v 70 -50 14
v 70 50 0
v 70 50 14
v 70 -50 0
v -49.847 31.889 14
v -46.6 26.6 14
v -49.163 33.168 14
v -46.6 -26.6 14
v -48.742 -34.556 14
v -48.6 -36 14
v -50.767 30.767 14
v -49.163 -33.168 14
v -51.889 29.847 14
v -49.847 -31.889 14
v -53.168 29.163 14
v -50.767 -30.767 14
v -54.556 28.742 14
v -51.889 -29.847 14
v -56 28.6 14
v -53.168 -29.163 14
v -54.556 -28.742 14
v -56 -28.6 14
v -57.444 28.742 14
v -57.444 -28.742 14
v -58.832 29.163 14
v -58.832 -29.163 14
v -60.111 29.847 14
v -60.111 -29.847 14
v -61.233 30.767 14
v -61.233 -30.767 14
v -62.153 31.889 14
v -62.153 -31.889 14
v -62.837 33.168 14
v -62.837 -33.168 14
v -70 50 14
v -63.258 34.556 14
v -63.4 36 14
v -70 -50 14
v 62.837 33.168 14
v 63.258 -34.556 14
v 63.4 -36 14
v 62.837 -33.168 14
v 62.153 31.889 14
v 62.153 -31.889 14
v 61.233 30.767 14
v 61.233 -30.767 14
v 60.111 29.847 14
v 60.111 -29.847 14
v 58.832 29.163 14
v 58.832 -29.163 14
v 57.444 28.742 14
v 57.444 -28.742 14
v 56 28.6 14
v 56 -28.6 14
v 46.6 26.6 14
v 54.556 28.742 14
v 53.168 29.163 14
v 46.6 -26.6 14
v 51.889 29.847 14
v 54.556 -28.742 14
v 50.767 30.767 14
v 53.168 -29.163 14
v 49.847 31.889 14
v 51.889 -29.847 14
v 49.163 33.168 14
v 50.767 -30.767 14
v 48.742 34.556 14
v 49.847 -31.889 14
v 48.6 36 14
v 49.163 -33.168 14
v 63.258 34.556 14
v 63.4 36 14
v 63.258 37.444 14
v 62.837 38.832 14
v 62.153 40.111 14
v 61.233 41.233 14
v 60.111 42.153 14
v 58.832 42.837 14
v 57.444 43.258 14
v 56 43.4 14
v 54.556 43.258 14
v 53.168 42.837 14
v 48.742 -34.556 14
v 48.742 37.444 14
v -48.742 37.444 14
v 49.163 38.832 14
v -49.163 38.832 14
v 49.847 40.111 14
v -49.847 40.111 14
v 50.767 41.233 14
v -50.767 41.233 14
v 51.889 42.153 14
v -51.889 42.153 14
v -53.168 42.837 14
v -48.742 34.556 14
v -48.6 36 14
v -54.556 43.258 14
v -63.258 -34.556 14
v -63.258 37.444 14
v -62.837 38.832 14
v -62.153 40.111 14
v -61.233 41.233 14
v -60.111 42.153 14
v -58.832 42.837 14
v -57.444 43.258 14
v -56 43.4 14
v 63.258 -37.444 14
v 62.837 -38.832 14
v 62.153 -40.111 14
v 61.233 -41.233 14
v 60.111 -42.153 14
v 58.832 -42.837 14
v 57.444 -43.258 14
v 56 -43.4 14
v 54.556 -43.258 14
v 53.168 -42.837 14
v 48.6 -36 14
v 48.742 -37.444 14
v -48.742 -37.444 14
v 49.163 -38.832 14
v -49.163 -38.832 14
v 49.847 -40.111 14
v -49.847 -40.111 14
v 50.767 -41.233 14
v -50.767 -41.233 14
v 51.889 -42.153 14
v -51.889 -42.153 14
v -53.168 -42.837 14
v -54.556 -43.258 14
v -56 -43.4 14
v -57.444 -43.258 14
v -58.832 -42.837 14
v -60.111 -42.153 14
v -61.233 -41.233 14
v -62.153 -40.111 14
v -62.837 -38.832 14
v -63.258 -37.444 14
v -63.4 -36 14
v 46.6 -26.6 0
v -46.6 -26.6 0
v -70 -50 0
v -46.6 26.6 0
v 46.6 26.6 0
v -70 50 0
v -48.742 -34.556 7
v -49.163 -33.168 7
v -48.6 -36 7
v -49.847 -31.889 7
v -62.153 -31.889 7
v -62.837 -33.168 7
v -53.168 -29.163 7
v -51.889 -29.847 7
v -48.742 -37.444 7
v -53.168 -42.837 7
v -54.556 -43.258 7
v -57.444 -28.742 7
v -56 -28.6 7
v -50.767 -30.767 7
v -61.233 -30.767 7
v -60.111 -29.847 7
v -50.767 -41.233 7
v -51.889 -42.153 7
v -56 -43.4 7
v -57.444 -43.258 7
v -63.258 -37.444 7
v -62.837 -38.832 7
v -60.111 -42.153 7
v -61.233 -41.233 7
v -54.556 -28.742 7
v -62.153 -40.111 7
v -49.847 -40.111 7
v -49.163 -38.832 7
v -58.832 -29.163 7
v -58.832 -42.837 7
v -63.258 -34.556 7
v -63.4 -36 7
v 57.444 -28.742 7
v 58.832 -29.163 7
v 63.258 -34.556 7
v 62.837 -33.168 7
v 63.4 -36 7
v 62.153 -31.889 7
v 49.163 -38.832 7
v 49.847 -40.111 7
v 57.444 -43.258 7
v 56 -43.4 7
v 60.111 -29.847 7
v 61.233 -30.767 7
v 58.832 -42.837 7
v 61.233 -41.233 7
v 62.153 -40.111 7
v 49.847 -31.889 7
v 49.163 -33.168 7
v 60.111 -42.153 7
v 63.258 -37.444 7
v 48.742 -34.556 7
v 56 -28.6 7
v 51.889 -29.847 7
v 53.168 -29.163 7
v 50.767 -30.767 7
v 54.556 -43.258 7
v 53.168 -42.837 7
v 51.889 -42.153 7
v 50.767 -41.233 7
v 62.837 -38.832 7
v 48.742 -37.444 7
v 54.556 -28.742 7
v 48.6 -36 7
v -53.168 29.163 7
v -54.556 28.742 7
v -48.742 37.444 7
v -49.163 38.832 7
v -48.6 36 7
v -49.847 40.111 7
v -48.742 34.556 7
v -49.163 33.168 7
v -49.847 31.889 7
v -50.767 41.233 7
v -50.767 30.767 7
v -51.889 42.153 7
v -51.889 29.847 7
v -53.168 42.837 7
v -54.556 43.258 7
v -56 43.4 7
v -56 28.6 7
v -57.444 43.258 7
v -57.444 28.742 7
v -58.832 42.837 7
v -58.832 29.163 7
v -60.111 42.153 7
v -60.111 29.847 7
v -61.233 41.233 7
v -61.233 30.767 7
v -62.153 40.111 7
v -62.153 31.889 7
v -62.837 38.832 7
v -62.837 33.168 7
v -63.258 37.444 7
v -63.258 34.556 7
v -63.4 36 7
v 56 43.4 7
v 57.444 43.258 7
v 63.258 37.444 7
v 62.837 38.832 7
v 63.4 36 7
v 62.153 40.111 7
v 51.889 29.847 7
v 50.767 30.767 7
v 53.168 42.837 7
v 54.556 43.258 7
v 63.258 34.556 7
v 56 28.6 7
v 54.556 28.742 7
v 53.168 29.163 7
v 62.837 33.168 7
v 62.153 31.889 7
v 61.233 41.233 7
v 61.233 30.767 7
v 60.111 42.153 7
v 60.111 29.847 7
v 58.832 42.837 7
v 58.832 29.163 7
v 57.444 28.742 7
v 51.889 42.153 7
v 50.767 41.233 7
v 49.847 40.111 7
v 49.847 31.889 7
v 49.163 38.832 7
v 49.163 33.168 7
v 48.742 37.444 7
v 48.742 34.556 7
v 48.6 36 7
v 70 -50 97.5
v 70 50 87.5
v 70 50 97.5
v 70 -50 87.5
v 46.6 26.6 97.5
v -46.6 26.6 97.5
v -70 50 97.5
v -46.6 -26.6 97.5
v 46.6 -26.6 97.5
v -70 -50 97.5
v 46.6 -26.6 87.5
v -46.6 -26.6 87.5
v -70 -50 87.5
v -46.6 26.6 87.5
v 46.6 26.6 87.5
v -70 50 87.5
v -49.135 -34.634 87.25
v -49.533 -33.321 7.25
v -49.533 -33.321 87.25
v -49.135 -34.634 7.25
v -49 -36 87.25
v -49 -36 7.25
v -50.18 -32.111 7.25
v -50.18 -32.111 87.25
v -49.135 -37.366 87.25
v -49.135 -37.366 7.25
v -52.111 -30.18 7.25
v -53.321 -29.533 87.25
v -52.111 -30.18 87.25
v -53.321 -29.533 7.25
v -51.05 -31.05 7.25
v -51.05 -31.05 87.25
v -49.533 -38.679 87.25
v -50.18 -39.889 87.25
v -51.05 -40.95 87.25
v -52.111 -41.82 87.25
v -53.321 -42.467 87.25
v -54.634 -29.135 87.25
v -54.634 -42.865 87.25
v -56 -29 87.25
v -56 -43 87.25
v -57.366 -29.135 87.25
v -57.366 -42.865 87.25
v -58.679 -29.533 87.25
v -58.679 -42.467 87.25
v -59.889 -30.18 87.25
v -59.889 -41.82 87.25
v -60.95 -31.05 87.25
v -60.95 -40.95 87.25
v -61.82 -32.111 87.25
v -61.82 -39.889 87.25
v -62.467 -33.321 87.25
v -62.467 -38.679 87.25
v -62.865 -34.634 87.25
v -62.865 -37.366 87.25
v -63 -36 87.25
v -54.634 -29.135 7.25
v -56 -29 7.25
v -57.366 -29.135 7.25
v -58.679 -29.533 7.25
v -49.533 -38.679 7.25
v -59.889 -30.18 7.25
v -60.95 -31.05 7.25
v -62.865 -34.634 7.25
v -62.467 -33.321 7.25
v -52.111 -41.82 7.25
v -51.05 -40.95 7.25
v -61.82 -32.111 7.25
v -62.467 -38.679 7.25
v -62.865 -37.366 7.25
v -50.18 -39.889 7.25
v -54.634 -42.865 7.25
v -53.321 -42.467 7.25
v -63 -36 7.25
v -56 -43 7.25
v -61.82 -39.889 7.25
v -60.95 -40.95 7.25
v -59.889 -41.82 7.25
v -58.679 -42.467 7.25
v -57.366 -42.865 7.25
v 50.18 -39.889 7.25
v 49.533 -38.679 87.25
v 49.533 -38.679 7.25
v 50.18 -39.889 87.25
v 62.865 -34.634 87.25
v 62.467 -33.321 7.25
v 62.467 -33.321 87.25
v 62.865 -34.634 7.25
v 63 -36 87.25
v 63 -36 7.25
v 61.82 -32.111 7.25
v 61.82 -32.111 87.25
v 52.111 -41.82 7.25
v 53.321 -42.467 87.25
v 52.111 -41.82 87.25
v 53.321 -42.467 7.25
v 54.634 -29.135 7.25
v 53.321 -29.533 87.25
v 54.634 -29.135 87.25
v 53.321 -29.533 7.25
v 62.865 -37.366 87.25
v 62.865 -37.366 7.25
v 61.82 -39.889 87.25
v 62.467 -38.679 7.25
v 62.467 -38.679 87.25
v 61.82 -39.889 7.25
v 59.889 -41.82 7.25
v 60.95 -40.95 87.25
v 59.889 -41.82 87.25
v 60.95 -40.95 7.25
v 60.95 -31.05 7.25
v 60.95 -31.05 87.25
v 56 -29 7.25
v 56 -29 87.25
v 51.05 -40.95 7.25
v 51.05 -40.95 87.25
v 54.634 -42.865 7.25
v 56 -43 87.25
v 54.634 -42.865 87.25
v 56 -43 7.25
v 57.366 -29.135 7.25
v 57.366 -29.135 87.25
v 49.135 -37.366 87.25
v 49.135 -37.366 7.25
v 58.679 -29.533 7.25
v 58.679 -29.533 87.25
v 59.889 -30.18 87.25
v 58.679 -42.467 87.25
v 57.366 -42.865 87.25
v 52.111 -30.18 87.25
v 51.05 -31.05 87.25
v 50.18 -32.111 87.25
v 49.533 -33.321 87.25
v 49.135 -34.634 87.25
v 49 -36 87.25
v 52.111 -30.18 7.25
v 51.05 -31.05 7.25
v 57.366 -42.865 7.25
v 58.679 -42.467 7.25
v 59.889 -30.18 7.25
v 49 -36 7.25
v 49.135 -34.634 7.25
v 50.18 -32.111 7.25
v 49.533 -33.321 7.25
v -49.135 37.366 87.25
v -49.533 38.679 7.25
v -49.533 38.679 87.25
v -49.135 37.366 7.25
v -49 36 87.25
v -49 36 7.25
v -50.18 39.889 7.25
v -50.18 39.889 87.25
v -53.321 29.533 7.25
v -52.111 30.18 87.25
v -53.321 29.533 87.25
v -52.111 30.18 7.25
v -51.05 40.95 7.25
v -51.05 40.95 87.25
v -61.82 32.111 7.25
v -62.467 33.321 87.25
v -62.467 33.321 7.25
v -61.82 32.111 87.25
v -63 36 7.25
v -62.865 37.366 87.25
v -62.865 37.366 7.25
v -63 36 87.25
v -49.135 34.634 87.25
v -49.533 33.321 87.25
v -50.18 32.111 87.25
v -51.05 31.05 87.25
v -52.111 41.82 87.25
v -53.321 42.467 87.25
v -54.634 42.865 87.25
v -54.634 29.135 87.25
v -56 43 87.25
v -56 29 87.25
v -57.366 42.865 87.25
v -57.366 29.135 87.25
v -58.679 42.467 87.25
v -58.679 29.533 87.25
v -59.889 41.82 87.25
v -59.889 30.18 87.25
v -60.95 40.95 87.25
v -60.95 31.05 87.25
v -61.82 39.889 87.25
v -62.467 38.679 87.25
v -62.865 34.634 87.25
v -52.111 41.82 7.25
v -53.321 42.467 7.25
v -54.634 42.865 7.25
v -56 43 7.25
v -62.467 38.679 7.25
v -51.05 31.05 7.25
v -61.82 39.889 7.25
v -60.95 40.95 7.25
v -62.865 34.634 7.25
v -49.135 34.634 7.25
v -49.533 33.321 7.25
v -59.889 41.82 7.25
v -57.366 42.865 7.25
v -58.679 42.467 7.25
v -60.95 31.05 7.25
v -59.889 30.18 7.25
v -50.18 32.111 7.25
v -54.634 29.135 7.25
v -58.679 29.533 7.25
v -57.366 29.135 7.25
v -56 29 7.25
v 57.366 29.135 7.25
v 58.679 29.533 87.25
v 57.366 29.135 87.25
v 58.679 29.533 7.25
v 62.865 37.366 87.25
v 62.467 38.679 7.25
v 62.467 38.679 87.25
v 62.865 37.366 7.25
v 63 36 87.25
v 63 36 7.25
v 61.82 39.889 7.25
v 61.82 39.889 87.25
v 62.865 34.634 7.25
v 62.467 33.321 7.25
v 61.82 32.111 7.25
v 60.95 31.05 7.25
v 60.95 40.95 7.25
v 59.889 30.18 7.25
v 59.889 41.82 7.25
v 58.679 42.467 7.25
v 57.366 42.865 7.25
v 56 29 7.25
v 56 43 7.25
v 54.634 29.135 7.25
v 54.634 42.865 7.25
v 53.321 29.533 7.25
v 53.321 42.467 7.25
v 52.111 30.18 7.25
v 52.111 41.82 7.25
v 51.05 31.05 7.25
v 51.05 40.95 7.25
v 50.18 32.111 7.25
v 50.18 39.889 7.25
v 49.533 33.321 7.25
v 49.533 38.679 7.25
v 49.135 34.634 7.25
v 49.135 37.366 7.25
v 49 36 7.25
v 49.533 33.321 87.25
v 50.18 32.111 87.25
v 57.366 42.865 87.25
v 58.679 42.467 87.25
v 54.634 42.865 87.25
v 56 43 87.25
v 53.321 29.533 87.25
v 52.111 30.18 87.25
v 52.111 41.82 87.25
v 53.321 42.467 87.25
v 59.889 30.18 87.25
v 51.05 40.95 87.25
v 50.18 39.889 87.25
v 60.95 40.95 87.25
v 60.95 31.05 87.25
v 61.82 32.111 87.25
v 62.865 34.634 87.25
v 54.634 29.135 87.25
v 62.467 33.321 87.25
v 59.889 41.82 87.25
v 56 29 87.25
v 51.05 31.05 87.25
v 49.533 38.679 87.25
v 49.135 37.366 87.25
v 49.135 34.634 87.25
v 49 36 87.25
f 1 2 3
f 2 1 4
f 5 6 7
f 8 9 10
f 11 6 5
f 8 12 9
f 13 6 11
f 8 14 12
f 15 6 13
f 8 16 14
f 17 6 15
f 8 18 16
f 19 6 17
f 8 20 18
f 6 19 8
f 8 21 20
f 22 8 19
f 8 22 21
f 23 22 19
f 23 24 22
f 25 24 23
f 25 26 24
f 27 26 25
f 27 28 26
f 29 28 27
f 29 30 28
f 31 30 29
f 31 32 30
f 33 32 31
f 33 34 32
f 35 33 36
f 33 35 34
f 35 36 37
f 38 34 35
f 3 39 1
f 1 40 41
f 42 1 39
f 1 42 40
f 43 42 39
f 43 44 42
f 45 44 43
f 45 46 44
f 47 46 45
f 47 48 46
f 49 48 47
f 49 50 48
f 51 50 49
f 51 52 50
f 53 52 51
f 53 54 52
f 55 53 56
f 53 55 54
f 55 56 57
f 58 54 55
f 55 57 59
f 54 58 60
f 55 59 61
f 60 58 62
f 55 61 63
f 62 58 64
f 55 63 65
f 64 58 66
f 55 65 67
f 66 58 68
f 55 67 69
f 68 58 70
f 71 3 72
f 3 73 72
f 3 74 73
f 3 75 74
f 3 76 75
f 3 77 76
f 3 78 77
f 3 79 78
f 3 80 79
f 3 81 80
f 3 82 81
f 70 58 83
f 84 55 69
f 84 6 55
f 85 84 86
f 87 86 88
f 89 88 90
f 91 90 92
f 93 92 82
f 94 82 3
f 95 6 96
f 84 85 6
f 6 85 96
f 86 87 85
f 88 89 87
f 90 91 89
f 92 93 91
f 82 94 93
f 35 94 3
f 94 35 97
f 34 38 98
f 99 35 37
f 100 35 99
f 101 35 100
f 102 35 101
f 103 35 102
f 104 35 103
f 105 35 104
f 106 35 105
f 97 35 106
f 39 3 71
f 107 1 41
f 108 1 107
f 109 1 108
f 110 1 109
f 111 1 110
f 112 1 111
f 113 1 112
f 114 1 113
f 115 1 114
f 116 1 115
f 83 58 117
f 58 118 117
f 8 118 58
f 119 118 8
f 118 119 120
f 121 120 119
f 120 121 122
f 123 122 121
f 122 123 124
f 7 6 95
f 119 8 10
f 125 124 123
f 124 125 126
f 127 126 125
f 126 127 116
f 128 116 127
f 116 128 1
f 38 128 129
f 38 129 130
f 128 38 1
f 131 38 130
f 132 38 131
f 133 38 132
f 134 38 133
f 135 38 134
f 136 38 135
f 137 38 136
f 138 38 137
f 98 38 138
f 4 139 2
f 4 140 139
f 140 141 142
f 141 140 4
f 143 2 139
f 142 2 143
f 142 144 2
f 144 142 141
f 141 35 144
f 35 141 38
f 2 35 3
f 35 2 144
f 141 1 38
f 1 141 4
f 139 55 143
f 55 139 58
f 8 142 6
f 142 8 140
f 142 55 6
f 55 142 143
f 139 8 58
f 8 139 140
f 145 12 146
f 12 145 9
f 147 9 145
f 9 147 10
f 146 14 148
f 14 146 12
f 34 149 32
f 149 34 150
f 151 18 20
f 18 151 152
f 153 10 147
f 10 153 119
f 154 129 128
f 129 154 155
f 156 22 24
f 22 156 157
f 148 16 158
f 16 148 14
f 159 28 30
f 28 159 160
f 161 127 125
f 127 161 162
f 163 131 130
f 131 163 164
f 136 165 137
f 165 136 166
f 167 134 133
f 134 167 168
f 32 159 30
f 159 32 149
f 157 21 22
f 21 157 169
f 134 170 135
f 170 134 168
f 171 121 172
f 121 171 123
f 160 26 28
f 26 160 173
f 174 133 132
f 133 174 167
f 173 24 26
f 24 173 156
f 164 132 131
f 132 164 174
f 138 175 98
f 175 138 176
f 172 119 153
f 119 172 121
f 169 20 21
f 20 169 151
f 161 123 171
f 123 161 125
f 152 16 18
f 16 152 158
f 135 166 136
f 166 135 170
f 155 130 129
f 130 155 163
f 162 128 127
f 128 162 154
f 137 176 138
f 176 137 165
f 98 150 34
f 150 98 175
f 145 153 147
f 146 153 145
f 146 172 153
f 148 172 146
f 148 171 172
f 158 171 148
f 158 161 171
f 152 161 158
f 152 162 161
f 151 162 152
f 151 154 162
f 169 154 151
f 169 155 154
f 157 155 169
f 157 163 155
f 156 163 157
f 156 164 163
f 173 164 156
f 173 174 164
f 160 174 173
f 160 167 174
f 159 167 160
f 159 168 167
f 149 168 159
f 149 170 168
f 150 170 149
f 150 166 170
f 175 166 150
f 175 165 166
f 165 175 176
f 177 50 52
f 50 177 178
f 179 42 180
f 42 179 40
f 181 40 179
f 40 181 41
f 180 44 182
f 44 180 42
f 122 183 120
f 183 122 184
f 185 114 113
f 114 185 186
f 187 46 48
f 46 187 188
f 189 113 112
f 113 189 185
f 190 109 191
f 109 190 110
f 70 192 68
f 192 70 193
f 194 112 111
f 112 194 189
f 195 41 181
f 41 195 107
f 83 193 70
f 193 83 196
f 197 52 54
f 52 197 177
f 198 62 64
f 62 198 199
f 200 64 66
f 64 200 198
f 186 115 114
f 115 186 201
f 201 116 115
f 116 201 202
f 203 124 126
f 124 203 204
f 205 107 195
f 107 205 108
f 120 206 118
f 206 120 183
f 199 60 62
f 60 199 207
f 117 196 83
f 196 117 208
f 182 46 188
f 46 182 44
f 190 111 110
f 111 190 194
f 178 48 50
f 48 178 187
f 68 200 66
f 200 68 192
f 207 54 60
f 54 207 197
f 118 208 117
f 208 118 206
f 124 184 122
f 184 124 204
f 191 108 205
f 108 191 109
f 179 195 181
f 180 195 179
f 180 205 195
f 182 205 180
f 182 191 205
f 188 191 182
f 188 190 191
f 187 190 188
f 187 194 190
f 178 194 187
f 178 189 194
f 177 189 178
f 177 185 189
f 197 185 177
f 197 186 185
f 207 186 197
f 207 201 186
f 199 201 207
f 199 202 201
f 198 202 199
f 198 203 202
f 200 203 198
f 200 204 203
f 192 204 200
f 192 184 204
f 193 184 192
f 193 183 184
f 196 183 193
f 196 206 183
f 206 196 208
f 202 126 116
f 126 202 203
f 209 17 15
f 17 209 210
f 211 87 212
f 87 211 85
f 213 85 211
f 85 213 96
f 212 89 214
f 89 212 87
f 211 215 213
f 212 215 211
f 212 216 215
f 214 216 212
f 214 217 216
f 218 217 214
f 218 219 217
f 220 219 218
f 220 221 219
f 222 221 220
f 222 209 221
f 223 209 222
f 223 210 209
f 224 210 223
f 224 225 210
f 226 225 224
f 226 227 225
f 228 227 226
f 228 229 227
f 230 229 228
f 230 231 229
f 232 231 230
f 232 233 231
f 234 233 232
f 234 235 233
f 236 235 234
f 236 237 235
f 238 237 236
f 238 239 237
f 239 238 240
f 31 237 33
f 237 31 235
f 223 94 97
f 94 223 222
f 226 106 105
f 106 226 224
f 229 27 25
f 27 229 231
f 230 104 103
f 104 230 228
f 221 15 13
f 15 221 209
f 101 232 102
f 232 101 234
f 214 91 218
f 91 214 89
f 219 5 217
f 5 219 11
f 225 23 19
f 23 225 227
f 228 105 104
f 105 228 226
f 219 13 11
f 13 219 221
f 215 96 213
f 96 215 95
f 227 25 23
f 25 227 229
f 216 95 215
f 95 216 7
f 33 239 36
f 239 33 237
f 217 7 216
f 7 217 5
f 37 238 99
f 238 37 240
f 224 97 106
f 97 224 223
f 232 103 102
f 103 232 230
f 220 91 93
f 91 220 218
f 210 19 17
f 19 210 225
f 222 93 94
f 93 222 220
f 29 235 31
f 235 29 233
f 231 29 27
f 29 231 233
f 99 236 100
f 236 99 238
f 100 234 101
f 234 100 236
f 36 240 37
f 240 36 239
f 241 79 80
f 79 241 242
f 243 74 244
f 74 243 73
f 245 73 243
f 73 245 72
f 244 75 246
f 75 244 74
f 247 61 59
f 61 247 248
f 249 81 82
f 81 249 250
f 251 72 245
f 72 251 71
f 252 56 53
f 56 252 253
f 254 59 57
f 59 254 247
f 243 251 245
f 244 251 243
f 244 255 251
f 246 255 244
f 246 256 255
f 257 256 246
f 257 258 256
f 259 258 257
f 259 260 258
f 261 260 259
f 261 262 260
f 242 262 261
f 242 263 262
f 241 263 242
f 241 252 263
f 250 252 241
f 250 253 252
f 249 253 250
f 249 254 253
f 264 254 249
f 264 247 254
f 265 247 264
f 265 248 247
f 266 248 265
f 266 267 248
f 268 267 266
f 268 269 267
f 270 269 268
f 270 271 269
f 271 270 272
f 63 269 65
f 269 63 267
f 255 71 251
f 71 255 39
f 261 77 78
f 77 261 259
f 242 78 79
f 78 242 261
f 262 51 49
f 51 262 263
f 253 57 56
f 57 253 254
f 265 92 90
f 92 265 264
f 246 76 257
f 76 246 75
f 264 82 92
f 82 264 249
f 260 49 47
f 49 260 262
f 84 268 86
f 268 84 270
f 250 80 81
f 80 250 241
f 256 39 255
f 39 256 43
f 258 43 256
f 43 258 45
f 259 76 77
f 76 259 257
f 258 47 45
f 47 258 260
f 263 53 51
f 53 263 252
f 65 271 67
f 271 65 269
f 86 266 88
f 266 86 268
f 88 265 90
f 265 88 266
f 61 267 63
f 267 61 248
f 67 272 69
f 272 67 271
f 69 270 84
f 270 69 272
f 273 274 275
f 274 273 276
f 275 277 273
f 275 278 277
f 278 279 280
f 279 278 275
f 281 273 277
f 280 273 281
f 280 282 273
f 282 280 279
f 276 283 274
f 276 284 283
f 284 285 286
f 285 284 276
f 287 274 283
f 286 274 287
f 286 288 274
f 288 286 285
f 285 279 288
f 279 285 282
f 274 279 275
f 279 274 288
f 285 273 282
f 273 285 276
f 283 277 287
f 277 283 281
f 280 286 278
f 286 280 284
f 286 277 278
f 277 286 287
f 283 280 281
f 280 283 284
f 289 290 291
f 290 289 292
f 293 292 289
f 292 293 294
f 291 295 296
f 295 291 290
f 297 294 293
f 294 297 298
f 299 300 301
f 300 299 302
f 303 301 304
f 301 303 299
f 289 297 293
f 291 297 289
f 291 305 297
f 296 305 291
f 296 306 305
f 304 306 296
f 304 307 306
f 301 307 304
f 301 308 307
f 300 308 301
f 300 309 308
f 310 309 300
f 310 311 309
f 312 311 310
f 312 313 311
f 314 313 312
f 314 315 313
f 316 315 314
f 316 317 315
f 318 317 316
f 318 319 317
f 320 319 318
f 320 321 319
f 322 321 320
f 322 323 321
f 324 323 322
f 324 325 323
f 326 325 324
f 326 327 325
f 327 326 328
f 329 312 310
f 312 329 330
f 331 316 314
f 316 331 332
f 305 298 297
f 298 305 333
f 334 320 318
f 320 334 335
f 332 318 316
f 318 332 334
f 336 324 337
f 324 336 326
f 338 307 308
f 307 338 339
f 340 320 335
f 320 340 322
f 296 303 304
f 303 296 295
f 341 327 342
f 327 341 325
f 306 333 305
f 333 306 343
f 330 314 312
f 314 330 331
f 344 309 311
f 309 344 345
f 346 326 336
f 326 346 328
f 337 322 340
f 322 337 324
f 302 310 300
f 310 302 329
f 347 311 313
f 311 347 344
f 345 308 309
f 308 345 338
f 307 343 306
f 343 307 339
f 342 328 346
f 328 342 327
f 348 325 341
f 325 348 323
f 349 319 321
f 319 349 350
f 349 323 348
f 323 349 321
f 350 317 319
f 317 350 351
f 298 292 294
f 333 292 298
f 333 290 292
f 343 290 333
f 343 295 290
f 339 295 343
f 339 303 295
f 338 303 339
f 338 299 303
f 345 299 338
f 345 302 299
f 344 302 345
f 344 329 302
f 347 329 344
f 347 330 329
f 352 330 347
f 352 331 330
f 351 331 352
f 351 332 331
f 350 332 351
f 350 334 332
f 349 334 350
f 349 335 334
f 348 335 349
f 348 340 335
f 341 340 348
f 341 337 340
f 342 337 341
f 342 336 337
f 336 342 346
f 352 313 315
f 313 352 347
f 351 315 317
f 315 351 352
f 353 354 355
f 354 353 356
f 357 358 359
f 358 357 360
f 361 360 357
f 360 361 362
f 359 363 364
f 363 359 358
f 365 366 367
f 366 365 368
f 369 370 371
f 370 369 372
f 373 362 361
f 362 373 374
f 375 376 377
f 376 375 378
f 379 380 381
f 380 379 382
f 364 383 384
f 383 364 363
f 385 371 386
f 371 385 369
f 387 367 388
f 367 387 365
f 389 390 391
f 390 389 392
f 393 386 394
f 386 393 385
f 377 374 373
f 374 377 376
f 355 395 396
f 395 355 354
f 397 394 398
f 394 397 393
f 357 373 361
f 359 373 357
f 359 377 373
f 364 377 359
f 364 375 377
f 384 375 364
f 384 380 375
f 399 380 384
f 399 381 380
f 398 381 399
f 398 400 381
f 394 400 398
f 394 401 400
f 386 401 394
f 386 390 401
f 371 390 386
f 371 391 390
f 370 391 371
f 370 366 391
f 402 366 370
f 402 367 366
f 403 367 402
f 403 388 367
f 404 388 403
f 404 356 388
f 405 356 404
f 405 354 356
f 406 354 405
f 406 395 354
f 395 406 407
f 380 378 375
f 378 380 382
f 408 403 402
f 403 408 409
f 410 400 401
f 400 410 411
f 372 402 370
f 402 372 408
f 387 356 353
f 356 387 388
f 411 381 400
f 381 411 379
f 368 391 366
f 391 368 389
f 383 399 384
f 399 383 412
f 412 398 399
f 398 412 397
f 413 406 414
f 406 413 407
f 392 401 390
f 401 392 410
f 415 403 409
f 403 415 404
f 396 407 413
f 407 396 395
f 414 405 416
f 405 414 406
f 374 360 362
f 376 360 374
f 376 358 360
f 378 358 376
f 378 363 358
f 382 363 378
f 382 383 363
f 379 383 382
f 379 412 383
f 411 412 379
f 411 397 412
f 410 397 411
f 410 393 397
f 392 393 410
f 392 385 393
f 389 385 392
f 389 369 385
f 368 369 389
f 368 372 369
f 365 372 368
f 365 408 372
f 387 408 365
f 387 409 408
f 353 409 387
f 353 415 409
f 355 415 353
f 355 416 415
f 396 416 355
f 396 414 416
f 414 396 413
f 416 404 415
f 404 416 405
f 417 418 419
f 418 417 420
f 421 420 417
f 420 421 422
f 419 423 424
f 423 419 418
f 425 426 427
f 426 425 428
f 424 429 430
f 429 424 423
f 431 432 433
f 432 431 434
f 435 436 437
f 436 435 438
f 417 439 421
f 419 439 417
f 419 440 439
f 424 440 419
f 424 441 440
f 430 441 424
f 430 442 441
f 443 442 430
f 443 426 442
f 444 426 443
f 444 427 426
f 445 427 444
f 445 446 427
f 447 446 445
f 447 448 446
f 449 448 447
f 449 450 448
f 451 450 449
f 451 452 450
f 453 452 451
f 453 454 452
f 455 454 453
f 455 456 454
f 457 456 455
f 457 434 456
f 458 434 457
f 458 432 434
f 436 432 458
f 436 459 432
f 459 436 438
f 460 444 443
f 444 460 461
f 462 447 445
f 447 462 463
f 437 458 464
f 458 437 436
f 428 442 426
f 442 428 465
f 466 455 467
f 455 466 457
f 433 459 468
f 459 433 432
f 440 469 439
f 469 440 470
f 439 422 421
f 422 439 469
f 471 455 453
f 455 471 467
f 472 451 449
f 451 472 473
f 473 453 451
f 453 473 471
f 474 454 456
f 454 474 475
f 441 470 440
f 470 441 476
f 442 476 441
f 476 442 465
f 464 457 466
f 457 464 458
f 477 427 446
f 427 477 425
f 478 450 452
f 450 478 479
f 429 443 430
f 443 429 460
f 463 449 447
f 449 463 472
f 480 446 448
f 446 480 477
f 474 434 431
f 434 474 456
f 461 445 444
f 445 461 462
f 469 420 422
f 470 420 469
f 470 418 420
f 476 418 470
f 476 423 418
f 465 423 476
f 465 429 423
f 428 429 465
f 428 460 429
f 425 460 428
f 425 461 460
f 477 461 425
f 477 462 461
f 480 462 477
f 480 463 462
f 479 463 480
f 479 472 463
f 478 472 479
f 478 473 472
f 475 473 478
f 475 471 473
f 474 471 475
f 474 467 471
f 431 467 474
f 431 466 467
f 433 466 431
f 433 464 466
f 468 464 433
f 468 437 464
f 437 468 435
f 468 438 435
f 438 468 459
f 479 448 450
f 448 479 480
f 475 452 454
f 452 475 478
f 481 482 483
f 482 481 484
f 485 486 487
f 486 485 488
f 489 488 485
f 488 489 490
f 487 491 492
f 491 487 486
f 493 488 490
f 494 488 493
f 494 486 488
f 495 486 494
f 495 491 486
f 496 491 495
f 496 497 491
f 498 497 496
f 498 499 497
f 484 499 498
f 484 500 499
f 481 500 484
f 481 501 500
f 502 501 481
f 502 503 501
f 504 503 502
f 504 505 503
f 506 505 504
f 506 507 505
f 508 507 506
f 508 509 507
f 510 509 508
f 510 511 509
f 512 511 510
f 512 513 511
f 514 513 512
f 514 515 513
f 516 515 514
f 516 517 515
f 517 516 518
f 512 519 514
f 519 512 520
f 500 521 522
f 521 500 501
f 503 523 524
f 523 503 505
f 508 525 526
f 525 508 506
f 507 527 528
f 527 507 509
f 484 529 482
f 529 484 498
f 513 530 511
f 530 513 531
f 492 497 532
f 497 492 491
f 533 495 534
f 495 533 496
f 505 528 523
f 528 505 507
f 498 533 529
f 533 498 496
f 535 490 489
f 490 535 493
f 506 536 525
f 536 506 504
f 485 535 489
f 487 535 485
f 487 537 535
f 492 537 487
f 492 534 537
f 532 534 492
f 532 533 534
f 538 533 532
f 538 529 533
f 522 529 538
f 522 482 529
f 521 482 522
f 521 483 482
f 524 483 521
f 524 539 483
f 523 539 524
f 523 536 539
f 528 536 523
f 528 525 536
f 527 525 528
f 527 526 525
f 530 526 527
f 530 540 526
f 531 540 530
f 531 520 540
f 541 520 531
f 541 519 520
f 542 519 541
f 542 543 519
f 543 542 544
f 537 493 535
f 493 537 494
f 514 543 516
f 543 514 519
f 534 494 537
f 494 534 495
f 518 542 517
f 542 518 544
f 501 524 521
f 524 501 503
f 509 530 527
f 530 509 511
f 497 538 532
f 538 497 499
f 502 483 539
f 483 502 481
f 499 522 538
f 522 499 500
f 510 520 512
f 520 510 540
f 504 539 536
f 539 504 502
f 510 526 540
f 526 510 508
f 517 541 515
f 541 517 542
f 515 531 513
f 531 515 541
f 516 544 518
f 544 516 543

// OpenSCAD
$fn = 32;

// ------------------------------------------------------------------------
// Frame cube: base 140 x 100 mm, posts 80 mm tall
// Every part is its own module, assembly() places every instance.
// ------------------------------------------------------------------------

// --- part 1 ---
module base_frame() {
  difference() {
    translate([-70, -50, 0]) cube([140, 100, 14]);
    translate([-46.6, -26.6, -1]) cube([93.2, 53.2, 16]);
    translate([-56, -36, 7]) cylinder(h = 8, d = 14.8);
    translate([56, -36, 7]) cylinder(h = 8, d = 14.8);
    translate([-56, 36, 7]) cylinder(h = 8, d = 14.8);
    translate([56, 36, 7]) cylinder(h = 8, d = 14.8);
  }
}

// --- part 2 ---
module corner_post() {
  cylinder(h = 80, d = 14);
}

// --- part 3 ---
module top_frame() {
  difference() {
    translate([-70, -50, 0]) cube([140, 100, 10]);
    translate([-46.6, -26.6, -1]) cube([93.2, 53.2, 12]);
  }
}

// --- assembly ---
module assembly() {
  color([0.80, 0.24, 0.20]) translate([0, 0, 0]) rotate([0, 0, 0]) base_frame();
  color([0.20, 0.45, 0.75]) translate([-56, -36, 7.25]) rotate([0, 0, 0]) corner_post();
  color([0.25, 0.62, 0.32]) translate([56, -36, 7.25]) rotate([0, 0, 0]) corner_post();
  color([0.92, 0.70, 0.18]) translate([-56, 36, 7.25]) rotate([0, 0, 0]) corner_post();
  color([0.58, 0.35, 0.70]) translate([56, 36, 7.25]) rotate([0, 0, 0]) corner_post();
  color([0.16, 0.66, 0.66]) translate([0, 0, 87.5]) rotate([0, 0, 0]) top_frame();
}

assembly();
